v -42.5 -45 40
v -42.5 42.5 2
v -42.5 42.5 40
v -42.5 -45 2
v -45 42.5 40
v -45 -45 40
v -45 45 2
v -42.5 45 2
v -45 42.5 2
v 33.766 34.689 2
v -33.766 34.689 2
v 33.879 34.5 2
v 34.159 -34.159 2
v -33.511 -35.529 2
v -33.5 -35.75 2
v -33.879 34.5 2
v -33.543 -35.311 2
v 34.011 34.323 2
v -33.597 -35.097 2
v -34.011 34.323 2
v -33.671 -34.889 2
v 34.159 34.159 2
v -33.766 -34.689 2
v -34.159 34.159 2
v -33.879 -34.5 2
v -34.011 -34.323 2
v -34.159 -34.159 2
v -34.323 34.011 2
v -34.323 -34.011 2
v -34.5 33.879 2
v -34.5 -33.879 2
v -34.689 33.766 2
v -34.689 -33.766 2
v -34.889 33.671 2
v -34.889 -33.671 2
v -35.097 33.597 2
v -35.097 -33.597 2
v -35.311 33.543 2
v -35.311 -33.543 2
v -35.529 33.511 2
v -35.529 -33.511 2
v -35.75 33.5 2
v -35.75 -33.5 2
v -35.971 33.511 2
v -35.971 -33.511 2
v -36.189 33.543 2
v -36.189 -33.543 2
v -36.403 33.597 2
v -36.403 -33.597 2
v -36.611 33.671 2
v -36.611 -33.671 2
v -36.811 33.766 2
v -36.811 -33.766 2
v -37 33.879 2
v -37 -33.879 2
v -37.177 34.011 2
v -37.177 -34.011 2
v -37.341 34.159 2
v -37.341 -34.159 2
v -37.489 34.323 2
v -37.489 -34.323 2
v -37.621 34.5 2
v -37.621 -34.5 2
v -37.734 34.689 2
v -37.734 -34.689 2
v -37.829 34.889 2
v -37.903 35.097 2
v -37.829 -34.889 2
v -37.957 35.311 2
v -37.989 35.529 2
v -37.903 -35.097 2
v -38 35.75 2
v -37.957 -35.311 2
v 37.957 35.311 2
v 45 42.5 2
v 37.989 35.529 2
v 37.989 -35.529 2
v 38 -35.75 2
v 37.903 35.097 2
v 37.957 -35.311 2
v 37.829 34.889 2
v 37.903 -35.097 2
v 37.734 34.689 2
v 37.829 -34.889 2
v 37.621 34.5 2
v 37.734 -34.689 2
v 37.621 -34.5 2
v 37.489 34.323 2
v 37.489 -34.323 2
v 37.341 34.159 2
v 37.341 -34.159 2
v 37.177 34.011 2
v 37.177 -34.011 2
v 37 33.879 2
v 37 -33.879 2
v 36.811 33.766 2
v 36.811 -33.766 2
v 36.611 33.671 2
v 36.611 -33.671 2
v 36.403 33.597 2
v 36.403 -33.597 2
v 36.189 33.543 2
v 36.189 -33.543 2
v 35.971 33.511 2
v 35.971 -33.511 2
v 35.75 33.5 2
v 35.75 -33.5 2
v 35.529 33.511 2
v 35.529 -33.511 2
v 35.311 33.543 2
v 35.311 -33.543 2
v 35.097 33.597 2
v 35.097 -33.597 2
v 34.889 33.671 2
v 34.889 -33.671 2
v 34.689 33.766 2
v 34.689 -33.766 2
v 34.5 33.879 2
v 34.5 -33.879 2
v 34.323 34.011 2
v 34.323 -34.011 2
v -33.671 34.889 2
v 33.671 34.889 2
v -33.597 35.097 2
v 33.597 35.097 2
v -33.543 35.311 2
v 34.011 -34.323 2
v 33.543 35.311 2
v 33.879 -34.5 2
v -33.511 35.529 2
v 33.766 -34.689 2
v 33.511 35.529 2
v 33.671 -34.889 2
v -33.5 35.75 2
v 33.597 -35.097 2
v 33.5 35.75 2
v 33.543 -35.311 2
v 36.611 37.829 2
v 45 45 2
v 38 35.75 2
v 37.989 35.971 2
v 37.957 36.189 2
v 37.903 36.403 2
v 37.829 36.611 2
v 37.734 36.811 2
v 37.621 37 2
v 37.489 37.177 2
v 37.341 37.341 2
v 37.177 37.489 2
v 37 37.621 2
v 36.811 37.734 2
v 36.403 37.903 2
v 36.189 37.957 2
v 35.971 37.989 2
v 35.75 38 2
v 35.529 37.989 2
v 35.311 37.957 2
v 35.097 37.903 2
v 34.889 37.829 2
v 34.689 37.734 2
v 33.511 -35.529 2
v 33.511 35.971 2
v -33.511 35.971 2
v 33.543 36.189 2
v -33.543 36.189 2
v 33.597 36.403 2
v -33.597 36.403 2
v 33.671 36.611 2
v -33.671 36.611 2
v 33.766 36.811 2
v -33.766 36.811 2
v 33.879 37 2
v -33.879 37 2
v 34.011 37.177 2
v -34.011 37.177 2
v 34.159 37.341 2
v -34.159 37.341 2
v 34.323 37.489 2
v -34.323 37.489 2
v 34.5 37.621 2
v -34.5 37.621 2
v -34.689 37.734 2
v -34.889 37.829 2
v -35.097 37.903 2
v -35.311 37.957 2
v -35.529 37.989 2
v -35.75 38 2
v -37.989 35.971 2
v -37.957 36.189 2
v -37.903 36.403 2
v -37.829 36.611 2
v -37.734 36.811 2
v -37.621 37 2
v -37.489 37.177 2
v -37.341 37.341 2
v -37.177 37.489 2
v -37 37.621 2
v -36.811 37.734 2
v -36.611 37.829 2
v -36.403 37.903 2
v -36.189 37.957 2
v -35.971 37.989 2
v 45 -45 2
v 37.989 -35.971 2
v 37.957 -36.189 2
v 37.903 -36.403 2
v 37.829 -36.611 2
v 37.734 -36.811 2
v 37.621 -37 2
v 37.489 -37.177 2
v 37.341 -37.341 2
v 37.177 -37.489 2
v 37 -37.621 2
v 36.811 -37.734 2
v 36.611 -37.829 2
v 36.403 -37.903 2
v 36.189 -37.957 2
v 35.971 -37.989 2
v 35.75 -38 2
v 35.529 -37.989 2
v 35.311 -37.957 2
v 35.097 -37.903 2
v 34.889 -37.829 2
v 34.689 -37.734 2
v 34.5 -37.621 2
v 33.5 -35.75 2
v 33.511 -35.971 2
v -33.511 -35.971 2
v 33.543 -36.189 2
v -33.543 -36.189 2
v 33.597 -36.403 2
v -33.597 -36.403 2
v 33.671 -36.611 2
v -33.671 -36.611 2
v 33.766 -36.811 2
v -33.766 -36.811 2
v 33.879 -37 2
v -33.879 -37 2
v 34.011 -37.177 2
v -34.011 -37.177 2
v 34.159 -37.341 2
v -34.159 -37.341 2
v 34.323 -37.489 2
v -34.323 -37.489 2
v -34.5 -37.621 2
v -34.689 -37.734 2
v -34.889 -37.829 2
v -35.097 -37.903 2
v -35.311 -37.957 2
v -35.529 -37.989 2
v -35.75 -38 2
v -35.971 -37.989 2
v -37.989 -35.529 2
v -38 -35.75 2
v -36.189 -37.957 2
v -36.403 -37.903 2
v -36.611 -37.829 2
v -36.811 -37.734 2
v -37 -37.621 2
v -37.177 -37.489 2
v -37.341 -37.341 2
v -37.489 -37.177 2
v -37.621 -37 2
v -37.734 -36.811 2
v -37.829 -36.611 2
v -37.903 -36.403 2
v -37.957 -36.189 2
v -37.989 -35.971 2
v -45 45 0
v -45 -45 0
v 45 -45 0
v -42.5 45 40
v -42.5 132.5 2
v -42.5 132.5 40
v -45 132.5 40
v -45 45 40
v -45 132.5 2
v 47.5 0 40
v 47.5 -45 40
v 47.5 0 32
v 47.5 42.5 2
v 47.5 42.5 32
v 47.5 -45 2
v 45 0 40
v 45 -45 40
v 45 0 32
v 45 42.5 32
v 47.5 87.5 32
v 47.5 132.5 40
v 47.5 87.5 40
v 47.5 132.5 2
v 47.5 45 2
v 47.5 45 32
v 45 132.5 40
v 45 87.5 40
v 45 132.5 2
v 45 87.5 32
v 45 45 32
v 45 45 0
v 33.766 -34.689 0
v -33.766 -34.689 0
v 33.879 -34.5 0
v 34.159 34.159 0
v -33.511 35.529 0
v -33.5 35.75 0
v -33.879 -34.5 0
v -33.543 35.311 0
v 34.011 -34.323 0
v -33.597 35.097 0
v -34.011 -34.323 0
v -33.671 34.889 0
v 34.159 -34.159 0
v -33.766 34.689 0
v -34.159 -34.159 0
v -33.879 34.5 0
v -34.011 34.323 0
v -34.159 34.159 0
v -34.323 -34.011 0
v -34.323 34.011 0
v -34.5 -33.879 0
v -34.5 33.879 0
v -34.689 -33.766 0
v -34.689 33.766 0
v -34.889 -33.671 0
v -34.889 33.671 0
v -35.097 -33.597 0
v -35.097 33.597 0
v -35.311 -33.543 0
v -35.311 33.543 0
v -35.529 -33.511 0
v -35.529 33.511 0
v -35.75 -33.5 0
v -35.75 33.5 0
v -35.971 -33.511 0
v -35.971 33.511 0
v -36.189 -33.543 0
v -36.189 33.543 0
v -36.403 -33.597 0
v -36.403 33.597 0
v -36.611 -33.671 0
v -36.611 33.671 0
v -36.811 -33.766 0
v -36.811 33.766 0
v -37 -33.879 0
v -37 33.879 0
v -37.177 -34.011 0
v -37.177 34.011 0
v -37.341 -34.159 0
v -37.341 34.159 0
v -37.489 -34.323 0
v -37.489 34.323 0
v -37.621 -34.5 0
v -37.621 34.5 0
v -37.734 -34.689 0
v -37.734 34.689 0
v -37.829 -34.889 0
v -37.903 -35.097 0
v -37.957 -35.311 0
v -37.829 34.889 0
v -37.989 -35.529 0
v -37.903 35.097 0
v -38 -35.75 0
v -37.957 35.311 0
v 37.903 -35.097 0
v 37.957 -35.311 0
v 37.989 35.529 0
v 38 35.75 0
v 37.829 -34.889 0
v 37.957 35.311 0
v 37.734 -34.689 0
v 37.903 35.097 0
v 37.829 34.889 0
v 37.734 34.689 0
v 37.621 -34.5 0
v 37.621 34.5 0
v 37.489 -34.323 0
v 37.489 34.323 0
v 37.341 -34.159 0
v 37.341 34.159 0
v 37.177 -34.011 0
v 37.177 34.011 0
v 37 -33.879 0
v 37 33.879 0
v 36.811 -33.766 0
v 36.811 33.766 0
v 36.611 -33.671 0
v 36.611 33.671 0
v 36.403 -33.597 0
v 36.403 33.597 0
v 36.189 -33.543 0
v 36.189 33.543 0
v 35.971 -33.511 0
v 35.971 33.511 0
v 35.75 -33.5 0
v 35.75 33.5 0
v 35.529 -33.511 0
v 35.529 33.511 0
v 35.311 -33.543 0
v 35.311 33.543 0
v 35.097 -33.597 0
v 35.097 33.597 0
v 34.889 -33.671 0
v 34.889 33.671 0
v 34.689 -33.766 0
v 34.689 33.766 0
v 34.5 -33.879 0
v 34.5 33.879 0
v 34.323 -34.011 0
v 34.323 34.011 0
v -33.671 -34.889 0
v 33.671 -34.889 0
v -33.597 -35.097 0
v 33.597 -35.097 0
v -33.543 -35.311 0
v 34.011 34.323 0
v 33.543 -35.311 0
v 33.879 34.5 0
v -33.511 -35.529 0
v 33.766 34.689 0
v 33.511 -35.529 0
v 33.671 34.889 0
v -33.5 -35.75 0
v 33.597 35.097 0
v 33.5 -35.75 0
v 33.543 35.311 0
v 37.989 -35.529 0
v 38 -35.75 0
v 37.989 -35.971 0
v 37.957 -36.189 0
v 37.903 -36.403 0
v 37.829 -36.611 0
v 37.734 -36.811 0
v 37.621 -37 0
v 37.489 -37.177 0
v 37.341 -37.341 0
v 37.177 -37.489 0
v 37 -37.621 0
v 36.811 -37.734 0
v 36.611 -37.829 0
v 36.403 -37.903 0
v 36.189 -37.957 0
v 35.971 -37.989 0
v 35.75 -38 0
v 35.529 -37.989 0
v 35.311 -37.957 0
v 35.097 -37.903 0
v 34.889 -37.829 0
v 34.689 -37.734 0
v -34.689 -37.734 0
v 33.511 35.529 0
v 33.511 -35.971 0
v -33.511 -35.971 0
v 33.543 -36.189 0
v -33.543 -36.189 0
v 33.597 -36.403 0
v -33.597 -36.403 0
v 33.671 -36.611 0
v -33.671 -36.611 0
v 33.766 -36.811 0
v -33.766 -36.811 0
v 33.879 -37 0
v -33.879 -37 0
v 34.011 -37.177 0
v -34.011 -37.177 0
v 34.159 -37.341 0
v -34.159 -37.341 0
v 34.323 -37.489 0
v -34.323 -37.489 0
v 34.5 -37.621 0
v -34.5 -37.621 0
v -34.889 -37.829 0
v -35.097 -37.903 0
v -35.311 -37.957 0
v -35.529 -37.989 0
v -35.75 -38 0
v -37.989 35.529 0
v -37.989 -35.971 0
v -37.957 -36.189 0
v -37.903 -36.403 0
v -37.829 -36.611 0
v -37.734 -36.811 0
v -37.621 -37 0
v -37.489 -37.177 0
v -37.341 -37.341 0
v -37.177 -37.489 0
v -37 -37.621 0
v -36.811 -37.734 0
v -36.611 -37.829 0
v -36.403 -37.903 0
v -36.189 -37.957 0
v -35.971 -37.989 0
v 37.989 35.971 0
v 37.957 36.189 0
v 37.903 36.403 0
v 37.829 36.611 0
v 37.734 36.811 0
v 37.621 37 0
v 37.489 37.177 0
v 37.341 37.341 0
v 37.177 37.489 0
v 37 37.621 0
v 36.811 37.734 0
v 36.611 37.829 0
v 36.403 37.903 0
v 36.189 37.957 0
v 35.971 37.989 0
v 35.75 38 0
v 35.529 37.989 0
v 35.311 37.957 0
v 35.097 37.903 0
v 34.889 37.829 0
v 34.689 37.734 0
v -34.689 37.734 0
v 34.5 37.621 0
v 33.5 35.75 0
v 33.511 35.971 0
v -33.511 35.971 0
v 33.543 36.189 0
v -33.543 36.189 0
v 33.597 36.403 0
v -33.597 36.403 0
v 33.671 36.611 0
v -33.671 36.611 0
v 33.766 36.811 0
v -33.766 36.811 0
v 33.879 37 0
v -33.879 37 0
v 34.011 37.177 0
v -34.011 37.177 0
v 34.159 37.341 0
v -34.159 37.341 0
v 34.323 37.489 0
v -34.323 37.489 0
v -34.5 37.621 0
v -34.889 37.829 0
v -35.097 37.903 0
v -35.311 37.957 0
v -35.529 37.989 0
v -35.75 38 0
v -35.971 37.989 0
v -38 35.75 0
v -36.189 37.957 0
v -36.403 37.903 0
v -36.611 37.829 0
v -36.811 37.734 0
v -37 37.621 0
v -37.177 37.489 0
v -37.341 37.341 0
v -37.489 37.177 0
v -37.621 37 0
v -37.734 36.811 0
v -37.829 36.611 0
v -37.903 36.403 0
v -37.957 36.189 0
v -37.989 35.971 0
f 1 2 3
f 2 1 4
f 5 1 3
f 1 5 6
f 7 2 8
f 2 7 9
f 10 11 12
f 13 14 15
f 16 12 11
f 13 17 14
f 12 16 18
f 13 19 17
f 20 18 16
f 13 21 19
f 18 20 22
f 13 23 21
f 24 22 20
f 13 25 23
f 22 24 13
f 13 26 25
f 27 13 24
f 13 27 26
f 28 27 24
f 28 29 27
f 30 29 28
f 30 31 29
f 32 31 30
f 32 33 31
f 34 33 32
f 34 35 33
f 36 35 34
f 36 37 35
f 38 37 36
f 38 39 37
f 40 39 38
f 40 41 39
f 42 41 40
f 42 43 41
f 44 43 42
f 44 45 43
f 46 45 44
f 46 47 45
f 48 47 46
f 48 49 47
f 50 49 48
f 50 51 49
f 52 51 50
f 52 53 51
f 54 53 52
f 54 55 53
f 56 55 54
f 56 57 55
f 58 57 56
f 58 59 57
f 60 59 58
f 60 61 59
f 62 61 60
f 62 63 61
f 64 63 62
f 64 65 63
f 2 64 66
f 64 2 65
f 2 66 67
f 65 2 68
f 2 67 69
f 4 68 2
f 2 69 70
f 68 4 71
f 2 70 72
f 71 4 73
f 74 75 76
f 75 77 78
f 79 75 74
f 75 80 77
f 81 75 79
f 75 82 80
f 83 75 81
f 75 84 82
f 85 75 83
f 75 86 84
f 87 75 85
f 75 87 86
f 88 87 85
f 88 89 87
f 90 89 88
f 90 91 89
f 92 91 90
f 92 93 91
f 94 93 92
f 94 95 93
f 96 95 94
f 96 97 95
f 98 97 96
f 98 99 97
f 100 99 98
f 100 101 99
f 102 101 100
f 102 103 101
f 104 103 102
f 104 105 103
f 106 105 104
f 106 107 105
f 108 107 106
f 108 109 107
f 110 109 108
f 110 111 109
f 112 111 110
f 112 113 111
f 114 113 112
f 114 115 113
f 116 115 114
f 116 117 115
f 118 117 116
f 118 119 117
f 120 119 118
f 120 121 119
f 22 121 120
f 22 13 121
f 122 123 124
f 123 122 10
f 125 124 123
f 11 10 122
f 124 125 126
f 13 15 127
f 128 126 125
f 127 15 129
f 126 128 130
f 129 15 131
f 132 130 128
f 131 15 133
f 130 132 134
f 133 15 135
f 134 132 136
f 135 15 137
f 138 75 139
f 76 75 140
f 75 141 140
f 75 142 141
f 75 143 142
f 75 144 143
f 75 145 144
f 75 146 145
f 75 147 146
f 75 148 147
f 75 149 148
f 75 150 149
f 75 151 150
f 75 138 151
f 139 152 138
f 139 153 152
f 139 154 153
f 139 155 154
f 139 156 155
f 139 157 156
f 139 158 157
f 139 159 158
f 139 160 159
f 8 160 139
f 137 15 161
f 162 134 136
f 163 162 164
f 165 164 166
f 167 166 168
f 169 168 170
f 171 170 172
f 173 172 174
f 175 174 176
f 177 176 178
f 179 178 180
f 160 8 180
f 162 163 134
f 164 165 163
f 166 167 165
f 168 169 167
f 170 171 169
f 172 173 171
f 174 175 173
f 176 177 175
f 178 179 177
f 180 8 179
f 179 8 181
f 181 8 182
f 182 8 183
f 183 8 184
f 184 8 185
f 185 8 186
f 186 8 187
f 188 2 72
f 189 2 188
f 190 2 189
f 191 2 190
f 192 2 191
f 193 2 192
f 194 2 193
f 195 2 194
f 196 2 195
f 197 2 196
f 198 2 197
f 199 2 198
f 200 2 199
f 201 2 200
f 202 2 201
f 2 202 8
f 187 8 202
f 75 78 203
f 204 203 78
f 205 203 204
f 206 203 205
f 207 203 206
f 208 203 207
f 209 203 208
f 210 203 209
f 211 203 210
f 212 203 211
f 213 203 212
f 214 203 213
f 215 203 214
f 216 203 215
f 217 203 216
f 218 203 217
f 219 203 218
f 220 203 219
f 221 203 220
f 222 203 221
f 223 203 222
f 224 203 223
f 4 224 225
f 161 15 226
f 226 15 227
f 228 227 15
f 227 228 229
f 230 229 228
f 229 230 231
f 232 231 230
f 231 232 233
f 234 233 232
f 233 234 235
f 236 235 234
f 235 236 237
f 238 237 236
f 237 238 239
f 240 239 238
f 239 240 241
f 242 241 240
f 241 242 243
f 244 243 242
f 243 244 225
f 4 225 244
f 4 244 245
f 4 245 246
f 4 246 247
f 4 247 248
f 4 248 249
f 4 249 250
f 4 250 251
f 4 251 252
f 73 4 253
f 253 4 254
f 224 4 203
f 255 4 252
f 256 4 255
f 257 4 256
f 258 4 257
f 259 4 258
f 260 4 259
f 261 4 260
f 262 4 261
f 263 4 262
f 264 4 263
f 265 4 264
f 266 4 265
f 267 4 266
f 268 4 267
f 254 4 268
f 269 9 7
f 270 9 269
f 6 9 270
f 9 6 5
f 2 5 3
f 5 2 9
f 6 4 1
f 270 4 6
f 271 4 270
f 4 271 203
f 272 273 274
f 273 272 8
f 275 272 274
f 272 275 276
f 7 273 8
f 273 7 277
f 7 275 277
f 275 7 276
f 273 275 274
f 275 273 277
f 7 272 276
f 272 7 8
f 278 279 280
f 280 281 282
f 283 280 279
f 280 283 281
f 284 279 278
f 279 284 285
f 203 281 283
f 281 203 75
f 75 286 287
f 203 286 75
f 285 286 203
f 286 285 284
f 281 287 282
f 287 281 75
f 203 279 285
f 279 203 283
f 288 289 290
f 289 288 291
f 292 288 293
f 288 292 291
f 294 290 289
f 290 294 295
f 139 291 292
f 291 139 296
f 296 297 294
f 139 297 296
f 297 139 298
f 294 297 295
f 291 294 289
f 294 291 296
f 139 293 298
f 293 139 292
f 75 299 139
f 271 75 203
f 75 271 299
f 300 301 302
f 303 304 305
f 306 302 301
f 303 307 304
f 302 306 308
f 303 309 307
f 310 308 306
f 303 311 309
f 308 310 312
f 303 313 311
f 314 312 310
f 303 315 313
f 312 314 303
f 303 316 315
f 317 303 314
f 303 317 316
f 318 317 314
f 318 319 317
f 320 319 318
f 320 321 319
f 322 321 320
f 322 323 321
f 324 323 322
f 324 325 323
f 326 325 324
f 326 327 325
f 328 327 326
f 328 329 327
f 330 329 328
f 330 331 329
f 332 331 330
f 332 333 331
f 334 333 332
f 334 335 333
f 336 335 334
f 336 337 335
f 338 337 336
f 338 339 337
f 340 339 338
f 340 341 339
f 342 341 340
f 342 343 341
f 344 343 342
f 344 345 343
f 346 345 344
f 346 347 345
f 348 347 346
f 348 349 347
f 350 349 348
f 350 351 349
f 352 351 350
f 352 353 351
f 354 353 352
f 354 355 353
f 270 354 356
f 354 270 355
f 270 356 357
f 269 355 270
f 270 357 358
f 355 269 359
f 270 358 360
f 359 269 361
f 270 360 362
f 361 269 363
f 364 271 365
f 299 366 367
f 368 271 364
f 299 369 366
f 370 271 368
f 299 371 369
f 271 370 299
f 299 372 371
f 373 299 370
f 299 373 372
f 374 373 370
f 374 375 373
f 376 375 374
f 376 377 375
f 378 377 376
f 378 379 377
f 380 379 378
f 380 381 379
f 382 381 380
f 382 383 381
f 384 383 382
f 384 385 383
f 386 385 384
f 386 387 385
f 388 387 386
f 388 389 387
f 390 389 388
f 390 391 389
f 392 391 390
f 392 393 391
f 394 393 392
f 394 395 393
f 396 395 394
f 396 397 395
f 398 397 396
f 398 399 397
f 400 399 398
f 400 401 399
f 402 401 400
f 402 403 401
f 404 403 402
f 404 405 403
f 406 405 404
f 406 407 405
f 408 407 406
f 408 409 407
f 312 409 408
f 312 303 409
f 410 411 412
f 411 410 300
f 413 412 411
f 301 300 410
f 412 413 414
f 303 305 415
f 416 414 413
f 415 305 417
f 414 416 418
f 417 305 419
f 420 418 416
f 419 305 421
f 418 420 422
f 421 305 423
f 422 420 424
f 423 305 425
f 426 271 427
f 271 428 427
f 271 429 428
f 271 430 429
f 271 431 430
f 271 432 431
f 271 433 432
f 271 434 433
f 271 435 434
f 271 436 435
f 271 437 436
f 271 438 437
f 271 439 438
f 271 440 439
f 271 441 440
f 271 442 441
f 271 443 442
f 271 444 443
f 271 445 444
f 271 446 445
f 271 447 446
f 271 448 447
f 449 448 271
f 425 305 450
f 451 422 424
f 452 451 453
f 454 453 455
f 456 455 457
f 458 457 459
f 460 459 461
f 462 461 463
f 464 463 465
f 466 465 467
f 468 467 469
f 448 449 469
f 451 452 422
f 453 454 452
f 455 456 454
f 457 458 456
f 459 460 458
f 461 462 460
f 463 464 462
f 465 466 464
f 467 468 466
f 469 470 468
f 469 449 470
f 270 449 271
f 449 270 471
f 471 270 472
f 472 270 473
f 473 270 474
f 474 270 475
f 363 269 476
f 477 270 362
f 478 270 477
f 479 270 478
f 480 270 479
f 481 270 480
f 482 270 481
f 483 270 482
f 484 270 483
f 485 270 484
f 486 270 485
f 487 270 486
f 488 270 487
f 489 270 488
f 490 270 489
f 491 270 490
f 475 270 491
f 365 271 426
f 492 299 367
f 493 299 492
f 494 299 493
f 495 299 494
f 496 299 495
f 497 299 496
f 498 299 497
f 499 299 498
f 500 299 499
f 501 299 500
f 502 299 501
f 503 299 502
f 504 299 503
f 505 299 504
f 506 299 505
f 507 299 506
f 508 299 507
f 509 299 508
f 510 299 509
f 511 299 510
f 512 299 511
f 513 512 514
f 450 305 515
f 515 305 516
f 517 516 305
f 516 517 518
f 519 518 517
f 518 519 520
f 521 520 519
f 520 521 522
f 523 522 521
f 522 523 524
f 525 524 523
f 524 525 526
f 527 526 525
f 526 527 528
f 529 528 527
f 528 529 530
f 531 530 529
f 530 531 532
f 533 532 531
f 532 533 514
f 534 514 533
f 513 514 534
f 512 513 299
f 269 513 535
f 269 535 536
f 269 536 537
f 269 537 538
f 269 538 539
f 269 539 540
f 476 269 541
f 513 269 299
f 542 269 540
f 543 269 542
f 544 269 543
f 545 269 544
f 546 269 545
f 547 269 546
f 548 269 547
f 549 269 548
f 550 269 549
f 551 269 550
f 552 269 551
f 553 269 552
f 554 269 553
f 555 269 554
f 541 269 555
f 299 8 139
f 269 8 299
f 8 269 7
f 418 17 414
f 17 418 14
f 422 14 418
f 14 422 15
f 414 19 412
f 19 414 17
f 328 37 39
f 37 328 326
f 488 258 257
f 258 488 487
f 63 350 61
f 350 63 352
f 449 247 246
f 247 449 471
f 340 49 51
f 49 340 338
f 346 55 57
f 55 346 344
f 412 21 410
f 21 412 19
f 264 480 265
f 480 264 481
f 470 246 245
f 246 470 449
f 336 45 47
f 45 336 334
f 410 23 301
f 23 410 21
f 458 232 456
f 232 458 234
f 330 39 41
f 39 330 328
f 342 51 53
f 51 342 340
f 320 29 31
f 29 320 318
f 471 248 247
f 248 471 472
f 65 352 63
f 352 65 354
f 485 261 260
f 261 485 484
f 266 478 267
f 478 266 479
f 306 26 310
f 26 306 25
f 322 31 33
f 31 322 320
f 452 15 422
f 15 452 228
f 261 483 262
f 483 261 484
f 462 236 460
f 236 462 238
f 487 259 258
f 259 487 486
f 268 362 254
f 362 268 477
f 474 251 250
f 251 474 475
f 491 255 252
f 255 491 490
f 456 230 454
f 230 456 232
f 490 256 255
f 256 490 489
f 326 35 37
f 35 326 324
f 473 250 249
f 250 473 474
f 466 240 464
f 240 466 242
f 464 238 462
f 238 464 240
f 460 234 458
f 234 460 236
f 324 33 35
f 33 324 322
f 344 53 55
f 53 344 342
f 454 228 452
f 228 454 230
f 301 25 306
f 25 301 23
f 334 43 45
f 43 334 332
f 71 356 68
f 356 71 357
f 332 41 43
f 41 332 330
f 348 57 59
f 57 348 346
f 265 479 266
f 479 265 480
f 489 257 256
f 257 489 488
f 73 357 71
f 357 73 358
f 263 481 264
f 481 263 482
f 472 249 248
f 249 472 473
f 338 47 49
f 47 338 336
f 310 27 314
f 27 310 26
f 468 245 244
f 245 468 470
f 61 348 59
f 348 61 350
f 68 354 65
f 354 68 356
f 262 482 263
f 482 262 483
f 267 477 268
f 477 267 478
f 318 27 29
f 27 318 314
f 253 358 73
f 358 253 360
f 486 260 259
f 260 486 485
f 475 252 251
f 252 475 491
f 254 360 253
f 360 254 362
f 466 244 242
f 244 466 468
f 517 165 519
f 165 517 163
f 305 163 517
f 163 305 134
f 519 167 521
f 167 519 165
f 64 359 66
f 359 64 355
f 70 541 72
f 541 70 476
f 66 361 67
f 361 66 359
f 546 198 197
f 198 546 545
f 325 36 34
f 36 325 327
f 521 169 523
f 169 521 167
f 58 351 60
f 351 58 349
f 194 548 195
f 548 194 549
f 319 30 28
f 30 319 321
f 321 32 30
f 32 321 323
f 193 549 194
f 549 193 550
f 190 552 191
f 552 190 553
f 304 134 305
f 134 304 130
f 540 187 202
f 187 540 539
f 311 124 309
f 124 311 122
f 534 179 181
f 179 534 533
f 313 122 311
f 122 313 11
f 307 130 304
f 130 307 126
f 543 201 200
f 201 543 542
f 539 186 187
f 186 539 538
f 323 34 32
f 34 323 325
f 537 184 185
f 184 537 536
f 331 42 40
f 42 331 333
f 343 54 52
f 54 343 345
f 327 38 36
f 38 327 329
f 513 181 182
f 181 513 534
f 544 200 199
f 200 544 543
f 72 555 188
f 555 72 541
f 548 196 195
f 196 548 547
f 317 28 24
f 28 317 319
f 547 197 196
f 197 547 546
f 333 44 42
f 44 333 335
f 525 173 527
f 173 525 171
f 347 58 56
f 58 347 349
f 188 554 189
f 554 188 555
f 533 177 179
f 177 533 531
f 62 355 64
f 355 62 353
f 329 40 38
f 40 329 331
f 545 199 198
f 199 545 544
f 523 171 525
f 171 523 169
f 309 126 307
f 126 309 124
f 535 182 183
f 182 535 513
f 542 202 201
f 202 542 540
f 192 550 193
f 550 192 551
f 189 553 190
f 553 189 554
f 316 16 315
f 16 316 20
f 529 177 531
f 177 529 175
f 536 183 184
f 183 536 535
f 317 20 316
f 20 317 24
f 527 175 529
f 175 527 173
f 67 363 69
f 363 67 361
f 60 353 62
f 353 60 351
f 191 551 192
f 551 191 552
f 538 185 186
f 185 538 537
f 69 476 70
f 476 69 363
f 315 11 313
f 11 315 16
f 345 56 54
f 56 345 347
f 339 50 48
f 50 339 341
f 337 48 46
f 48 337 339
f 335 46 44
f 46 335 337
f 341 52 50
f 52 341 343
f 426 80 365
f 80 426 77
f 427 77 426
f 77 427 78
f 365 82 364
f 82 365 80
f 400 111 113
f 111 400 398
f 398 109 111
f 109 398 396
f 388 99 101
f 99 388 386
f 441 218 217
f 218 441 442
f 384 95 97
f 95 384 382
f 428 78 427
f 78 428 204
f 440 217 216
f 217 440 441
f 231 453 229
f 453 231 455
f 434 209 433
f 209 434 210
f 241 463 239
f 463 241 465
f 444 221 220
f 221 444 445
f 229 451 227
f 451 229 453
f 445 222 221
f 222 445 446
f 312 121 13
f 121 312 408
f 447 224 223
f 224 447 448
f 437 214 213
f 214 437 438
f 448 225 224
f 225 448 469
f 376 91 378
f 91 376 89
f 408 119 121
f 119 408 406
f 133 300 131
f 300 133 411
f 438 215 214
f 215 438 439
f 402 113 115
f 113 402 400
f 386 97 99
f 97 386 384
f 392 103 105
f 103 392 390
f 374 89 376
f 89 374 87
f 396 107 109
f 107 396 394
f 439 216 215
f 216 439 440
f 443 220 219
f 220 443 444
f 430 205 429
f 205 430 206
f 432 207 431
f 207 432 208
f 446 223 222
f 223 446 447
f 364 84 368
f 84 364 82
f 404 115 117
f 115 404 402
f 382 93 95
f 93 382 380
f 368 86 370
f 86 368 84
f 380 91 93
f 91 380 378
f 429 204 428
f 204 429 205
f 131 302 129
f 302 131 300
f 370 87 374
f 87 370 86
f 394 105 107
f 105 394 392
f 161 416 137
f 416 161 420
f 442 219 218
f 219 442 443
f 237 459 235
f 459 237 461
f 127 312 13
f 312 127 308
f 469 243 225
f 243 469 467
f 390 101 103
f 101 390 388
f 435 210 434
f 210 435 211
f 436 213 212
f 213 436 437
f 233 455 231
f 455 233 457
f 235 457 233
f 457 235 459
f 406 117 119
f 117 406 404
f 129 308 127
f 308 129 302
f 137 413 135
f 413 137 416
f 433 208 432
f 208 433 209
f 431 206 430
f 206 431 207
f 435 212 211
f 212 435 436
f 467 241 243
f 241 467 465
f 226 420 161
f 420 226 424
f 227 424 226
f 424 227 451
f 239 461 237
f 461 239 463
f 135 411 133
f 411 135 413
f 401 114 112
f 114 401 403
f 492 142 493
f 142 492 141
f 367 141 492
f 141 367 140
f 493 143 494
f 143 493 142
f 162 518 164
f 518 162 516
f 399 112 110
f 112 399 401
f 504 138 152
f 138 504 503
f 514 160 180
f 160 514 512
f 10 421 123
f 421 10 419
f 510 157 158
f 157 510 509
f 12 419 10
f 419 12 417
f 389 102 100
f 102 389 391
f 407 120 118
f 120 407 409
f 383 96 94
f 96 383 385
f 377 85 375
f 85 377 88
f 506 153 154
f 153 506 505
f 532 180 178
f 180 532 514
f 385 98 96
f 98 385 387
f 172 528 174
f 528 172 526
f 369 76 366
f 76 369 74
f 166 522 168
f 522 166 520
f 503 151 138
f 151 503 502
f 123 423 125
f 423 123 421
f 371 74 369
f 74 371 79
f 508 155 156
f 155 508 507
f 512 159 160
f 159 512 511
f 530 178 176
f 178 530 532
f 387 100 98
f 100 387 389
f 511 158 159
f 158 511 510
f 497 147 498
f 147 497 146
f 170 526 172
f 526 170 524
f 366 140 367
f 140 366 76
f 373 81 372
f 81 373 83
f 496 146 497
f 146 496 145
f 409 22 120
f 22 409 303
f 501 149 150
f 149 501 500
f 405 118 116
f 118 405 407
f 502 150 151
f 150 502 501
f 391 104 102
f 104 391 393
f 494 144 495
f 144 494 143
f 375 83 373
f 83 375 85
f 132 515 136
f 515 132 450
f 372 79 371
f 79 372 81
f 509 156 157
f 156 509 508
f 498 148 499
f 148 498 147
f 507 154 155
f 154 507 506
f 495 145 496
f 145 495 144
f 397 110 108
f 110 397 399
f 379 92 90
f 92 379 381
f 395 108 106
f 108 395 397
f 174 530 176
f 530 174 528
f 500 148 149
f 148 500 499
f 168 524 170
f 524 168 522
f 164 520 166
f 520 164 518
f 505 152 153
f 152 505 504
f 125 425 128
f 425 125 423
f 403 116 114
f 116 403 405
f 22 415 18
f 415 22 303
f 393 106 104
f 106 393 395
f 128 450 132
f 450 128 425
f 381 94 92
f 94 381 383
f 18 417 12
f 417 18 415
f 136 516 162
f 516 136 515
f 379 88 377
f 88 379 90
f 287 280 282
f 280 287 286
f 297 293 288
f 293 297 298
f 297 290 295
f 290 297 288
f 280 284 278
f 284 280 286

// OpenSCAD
// Housing for a DIY magnetic stirrer built from an 80 mm PC case fan
// Printed upside down: top plate on the bed, walls rising upward, box open at the top.

$fn = 64;

// ---- Dimensions (mm) ----
fan_outer      = 80;    // fan outer size (reference)
housing_outer  = 90;    // housing outer size (X x Y)
top_thick      = 2;     // top plate thickness (z = 0 to 2)
wall_thick     = 2.5;   // wall thickness
total_h       = 40;     // overall height (top of walls)
cable_h       = 8;     // cable notch depth from open edge (z = 32 to 40)
screw_pitch   = 71.5;   // square pattern for M4 screw holes
screw_d       = 4.5;    // screw hole diameter

eps           = 0.5;   // cutter overshoot past faces

difference() {
    union() {
        // Top plate
        translate([-housing_outer/2, -housing_outer/2, 0])
            cube([housing_outer, housing_outer, top_thick]);
        // Four walls
        for (x = [-1, 1])
            for (y = [-1, 1])
                translate([x * housing_outer/2, y * housing_outer/2, top_thick])
                    cube([wall_thick, housing_outer - wall_thick, total_h - top_thick]);
    }

    // M4 screw holes through the top plate
    for (x = [-screw_pitch/2, screw_pitch/2])
        for (y = [-screw_pitch/2, screw_pitch/2])
            translate([x, y, -eps])
                cylinder(d = screw_d, h = top_thick + 2*eps);

    // Cable notch in one wall (X+ wall), centred along the wall
    translate([housing_outer/2 - 6, 0, total_h - cable_h])
        cube([12, housing_outer - wall_thick, cable_h + eps]);
}
